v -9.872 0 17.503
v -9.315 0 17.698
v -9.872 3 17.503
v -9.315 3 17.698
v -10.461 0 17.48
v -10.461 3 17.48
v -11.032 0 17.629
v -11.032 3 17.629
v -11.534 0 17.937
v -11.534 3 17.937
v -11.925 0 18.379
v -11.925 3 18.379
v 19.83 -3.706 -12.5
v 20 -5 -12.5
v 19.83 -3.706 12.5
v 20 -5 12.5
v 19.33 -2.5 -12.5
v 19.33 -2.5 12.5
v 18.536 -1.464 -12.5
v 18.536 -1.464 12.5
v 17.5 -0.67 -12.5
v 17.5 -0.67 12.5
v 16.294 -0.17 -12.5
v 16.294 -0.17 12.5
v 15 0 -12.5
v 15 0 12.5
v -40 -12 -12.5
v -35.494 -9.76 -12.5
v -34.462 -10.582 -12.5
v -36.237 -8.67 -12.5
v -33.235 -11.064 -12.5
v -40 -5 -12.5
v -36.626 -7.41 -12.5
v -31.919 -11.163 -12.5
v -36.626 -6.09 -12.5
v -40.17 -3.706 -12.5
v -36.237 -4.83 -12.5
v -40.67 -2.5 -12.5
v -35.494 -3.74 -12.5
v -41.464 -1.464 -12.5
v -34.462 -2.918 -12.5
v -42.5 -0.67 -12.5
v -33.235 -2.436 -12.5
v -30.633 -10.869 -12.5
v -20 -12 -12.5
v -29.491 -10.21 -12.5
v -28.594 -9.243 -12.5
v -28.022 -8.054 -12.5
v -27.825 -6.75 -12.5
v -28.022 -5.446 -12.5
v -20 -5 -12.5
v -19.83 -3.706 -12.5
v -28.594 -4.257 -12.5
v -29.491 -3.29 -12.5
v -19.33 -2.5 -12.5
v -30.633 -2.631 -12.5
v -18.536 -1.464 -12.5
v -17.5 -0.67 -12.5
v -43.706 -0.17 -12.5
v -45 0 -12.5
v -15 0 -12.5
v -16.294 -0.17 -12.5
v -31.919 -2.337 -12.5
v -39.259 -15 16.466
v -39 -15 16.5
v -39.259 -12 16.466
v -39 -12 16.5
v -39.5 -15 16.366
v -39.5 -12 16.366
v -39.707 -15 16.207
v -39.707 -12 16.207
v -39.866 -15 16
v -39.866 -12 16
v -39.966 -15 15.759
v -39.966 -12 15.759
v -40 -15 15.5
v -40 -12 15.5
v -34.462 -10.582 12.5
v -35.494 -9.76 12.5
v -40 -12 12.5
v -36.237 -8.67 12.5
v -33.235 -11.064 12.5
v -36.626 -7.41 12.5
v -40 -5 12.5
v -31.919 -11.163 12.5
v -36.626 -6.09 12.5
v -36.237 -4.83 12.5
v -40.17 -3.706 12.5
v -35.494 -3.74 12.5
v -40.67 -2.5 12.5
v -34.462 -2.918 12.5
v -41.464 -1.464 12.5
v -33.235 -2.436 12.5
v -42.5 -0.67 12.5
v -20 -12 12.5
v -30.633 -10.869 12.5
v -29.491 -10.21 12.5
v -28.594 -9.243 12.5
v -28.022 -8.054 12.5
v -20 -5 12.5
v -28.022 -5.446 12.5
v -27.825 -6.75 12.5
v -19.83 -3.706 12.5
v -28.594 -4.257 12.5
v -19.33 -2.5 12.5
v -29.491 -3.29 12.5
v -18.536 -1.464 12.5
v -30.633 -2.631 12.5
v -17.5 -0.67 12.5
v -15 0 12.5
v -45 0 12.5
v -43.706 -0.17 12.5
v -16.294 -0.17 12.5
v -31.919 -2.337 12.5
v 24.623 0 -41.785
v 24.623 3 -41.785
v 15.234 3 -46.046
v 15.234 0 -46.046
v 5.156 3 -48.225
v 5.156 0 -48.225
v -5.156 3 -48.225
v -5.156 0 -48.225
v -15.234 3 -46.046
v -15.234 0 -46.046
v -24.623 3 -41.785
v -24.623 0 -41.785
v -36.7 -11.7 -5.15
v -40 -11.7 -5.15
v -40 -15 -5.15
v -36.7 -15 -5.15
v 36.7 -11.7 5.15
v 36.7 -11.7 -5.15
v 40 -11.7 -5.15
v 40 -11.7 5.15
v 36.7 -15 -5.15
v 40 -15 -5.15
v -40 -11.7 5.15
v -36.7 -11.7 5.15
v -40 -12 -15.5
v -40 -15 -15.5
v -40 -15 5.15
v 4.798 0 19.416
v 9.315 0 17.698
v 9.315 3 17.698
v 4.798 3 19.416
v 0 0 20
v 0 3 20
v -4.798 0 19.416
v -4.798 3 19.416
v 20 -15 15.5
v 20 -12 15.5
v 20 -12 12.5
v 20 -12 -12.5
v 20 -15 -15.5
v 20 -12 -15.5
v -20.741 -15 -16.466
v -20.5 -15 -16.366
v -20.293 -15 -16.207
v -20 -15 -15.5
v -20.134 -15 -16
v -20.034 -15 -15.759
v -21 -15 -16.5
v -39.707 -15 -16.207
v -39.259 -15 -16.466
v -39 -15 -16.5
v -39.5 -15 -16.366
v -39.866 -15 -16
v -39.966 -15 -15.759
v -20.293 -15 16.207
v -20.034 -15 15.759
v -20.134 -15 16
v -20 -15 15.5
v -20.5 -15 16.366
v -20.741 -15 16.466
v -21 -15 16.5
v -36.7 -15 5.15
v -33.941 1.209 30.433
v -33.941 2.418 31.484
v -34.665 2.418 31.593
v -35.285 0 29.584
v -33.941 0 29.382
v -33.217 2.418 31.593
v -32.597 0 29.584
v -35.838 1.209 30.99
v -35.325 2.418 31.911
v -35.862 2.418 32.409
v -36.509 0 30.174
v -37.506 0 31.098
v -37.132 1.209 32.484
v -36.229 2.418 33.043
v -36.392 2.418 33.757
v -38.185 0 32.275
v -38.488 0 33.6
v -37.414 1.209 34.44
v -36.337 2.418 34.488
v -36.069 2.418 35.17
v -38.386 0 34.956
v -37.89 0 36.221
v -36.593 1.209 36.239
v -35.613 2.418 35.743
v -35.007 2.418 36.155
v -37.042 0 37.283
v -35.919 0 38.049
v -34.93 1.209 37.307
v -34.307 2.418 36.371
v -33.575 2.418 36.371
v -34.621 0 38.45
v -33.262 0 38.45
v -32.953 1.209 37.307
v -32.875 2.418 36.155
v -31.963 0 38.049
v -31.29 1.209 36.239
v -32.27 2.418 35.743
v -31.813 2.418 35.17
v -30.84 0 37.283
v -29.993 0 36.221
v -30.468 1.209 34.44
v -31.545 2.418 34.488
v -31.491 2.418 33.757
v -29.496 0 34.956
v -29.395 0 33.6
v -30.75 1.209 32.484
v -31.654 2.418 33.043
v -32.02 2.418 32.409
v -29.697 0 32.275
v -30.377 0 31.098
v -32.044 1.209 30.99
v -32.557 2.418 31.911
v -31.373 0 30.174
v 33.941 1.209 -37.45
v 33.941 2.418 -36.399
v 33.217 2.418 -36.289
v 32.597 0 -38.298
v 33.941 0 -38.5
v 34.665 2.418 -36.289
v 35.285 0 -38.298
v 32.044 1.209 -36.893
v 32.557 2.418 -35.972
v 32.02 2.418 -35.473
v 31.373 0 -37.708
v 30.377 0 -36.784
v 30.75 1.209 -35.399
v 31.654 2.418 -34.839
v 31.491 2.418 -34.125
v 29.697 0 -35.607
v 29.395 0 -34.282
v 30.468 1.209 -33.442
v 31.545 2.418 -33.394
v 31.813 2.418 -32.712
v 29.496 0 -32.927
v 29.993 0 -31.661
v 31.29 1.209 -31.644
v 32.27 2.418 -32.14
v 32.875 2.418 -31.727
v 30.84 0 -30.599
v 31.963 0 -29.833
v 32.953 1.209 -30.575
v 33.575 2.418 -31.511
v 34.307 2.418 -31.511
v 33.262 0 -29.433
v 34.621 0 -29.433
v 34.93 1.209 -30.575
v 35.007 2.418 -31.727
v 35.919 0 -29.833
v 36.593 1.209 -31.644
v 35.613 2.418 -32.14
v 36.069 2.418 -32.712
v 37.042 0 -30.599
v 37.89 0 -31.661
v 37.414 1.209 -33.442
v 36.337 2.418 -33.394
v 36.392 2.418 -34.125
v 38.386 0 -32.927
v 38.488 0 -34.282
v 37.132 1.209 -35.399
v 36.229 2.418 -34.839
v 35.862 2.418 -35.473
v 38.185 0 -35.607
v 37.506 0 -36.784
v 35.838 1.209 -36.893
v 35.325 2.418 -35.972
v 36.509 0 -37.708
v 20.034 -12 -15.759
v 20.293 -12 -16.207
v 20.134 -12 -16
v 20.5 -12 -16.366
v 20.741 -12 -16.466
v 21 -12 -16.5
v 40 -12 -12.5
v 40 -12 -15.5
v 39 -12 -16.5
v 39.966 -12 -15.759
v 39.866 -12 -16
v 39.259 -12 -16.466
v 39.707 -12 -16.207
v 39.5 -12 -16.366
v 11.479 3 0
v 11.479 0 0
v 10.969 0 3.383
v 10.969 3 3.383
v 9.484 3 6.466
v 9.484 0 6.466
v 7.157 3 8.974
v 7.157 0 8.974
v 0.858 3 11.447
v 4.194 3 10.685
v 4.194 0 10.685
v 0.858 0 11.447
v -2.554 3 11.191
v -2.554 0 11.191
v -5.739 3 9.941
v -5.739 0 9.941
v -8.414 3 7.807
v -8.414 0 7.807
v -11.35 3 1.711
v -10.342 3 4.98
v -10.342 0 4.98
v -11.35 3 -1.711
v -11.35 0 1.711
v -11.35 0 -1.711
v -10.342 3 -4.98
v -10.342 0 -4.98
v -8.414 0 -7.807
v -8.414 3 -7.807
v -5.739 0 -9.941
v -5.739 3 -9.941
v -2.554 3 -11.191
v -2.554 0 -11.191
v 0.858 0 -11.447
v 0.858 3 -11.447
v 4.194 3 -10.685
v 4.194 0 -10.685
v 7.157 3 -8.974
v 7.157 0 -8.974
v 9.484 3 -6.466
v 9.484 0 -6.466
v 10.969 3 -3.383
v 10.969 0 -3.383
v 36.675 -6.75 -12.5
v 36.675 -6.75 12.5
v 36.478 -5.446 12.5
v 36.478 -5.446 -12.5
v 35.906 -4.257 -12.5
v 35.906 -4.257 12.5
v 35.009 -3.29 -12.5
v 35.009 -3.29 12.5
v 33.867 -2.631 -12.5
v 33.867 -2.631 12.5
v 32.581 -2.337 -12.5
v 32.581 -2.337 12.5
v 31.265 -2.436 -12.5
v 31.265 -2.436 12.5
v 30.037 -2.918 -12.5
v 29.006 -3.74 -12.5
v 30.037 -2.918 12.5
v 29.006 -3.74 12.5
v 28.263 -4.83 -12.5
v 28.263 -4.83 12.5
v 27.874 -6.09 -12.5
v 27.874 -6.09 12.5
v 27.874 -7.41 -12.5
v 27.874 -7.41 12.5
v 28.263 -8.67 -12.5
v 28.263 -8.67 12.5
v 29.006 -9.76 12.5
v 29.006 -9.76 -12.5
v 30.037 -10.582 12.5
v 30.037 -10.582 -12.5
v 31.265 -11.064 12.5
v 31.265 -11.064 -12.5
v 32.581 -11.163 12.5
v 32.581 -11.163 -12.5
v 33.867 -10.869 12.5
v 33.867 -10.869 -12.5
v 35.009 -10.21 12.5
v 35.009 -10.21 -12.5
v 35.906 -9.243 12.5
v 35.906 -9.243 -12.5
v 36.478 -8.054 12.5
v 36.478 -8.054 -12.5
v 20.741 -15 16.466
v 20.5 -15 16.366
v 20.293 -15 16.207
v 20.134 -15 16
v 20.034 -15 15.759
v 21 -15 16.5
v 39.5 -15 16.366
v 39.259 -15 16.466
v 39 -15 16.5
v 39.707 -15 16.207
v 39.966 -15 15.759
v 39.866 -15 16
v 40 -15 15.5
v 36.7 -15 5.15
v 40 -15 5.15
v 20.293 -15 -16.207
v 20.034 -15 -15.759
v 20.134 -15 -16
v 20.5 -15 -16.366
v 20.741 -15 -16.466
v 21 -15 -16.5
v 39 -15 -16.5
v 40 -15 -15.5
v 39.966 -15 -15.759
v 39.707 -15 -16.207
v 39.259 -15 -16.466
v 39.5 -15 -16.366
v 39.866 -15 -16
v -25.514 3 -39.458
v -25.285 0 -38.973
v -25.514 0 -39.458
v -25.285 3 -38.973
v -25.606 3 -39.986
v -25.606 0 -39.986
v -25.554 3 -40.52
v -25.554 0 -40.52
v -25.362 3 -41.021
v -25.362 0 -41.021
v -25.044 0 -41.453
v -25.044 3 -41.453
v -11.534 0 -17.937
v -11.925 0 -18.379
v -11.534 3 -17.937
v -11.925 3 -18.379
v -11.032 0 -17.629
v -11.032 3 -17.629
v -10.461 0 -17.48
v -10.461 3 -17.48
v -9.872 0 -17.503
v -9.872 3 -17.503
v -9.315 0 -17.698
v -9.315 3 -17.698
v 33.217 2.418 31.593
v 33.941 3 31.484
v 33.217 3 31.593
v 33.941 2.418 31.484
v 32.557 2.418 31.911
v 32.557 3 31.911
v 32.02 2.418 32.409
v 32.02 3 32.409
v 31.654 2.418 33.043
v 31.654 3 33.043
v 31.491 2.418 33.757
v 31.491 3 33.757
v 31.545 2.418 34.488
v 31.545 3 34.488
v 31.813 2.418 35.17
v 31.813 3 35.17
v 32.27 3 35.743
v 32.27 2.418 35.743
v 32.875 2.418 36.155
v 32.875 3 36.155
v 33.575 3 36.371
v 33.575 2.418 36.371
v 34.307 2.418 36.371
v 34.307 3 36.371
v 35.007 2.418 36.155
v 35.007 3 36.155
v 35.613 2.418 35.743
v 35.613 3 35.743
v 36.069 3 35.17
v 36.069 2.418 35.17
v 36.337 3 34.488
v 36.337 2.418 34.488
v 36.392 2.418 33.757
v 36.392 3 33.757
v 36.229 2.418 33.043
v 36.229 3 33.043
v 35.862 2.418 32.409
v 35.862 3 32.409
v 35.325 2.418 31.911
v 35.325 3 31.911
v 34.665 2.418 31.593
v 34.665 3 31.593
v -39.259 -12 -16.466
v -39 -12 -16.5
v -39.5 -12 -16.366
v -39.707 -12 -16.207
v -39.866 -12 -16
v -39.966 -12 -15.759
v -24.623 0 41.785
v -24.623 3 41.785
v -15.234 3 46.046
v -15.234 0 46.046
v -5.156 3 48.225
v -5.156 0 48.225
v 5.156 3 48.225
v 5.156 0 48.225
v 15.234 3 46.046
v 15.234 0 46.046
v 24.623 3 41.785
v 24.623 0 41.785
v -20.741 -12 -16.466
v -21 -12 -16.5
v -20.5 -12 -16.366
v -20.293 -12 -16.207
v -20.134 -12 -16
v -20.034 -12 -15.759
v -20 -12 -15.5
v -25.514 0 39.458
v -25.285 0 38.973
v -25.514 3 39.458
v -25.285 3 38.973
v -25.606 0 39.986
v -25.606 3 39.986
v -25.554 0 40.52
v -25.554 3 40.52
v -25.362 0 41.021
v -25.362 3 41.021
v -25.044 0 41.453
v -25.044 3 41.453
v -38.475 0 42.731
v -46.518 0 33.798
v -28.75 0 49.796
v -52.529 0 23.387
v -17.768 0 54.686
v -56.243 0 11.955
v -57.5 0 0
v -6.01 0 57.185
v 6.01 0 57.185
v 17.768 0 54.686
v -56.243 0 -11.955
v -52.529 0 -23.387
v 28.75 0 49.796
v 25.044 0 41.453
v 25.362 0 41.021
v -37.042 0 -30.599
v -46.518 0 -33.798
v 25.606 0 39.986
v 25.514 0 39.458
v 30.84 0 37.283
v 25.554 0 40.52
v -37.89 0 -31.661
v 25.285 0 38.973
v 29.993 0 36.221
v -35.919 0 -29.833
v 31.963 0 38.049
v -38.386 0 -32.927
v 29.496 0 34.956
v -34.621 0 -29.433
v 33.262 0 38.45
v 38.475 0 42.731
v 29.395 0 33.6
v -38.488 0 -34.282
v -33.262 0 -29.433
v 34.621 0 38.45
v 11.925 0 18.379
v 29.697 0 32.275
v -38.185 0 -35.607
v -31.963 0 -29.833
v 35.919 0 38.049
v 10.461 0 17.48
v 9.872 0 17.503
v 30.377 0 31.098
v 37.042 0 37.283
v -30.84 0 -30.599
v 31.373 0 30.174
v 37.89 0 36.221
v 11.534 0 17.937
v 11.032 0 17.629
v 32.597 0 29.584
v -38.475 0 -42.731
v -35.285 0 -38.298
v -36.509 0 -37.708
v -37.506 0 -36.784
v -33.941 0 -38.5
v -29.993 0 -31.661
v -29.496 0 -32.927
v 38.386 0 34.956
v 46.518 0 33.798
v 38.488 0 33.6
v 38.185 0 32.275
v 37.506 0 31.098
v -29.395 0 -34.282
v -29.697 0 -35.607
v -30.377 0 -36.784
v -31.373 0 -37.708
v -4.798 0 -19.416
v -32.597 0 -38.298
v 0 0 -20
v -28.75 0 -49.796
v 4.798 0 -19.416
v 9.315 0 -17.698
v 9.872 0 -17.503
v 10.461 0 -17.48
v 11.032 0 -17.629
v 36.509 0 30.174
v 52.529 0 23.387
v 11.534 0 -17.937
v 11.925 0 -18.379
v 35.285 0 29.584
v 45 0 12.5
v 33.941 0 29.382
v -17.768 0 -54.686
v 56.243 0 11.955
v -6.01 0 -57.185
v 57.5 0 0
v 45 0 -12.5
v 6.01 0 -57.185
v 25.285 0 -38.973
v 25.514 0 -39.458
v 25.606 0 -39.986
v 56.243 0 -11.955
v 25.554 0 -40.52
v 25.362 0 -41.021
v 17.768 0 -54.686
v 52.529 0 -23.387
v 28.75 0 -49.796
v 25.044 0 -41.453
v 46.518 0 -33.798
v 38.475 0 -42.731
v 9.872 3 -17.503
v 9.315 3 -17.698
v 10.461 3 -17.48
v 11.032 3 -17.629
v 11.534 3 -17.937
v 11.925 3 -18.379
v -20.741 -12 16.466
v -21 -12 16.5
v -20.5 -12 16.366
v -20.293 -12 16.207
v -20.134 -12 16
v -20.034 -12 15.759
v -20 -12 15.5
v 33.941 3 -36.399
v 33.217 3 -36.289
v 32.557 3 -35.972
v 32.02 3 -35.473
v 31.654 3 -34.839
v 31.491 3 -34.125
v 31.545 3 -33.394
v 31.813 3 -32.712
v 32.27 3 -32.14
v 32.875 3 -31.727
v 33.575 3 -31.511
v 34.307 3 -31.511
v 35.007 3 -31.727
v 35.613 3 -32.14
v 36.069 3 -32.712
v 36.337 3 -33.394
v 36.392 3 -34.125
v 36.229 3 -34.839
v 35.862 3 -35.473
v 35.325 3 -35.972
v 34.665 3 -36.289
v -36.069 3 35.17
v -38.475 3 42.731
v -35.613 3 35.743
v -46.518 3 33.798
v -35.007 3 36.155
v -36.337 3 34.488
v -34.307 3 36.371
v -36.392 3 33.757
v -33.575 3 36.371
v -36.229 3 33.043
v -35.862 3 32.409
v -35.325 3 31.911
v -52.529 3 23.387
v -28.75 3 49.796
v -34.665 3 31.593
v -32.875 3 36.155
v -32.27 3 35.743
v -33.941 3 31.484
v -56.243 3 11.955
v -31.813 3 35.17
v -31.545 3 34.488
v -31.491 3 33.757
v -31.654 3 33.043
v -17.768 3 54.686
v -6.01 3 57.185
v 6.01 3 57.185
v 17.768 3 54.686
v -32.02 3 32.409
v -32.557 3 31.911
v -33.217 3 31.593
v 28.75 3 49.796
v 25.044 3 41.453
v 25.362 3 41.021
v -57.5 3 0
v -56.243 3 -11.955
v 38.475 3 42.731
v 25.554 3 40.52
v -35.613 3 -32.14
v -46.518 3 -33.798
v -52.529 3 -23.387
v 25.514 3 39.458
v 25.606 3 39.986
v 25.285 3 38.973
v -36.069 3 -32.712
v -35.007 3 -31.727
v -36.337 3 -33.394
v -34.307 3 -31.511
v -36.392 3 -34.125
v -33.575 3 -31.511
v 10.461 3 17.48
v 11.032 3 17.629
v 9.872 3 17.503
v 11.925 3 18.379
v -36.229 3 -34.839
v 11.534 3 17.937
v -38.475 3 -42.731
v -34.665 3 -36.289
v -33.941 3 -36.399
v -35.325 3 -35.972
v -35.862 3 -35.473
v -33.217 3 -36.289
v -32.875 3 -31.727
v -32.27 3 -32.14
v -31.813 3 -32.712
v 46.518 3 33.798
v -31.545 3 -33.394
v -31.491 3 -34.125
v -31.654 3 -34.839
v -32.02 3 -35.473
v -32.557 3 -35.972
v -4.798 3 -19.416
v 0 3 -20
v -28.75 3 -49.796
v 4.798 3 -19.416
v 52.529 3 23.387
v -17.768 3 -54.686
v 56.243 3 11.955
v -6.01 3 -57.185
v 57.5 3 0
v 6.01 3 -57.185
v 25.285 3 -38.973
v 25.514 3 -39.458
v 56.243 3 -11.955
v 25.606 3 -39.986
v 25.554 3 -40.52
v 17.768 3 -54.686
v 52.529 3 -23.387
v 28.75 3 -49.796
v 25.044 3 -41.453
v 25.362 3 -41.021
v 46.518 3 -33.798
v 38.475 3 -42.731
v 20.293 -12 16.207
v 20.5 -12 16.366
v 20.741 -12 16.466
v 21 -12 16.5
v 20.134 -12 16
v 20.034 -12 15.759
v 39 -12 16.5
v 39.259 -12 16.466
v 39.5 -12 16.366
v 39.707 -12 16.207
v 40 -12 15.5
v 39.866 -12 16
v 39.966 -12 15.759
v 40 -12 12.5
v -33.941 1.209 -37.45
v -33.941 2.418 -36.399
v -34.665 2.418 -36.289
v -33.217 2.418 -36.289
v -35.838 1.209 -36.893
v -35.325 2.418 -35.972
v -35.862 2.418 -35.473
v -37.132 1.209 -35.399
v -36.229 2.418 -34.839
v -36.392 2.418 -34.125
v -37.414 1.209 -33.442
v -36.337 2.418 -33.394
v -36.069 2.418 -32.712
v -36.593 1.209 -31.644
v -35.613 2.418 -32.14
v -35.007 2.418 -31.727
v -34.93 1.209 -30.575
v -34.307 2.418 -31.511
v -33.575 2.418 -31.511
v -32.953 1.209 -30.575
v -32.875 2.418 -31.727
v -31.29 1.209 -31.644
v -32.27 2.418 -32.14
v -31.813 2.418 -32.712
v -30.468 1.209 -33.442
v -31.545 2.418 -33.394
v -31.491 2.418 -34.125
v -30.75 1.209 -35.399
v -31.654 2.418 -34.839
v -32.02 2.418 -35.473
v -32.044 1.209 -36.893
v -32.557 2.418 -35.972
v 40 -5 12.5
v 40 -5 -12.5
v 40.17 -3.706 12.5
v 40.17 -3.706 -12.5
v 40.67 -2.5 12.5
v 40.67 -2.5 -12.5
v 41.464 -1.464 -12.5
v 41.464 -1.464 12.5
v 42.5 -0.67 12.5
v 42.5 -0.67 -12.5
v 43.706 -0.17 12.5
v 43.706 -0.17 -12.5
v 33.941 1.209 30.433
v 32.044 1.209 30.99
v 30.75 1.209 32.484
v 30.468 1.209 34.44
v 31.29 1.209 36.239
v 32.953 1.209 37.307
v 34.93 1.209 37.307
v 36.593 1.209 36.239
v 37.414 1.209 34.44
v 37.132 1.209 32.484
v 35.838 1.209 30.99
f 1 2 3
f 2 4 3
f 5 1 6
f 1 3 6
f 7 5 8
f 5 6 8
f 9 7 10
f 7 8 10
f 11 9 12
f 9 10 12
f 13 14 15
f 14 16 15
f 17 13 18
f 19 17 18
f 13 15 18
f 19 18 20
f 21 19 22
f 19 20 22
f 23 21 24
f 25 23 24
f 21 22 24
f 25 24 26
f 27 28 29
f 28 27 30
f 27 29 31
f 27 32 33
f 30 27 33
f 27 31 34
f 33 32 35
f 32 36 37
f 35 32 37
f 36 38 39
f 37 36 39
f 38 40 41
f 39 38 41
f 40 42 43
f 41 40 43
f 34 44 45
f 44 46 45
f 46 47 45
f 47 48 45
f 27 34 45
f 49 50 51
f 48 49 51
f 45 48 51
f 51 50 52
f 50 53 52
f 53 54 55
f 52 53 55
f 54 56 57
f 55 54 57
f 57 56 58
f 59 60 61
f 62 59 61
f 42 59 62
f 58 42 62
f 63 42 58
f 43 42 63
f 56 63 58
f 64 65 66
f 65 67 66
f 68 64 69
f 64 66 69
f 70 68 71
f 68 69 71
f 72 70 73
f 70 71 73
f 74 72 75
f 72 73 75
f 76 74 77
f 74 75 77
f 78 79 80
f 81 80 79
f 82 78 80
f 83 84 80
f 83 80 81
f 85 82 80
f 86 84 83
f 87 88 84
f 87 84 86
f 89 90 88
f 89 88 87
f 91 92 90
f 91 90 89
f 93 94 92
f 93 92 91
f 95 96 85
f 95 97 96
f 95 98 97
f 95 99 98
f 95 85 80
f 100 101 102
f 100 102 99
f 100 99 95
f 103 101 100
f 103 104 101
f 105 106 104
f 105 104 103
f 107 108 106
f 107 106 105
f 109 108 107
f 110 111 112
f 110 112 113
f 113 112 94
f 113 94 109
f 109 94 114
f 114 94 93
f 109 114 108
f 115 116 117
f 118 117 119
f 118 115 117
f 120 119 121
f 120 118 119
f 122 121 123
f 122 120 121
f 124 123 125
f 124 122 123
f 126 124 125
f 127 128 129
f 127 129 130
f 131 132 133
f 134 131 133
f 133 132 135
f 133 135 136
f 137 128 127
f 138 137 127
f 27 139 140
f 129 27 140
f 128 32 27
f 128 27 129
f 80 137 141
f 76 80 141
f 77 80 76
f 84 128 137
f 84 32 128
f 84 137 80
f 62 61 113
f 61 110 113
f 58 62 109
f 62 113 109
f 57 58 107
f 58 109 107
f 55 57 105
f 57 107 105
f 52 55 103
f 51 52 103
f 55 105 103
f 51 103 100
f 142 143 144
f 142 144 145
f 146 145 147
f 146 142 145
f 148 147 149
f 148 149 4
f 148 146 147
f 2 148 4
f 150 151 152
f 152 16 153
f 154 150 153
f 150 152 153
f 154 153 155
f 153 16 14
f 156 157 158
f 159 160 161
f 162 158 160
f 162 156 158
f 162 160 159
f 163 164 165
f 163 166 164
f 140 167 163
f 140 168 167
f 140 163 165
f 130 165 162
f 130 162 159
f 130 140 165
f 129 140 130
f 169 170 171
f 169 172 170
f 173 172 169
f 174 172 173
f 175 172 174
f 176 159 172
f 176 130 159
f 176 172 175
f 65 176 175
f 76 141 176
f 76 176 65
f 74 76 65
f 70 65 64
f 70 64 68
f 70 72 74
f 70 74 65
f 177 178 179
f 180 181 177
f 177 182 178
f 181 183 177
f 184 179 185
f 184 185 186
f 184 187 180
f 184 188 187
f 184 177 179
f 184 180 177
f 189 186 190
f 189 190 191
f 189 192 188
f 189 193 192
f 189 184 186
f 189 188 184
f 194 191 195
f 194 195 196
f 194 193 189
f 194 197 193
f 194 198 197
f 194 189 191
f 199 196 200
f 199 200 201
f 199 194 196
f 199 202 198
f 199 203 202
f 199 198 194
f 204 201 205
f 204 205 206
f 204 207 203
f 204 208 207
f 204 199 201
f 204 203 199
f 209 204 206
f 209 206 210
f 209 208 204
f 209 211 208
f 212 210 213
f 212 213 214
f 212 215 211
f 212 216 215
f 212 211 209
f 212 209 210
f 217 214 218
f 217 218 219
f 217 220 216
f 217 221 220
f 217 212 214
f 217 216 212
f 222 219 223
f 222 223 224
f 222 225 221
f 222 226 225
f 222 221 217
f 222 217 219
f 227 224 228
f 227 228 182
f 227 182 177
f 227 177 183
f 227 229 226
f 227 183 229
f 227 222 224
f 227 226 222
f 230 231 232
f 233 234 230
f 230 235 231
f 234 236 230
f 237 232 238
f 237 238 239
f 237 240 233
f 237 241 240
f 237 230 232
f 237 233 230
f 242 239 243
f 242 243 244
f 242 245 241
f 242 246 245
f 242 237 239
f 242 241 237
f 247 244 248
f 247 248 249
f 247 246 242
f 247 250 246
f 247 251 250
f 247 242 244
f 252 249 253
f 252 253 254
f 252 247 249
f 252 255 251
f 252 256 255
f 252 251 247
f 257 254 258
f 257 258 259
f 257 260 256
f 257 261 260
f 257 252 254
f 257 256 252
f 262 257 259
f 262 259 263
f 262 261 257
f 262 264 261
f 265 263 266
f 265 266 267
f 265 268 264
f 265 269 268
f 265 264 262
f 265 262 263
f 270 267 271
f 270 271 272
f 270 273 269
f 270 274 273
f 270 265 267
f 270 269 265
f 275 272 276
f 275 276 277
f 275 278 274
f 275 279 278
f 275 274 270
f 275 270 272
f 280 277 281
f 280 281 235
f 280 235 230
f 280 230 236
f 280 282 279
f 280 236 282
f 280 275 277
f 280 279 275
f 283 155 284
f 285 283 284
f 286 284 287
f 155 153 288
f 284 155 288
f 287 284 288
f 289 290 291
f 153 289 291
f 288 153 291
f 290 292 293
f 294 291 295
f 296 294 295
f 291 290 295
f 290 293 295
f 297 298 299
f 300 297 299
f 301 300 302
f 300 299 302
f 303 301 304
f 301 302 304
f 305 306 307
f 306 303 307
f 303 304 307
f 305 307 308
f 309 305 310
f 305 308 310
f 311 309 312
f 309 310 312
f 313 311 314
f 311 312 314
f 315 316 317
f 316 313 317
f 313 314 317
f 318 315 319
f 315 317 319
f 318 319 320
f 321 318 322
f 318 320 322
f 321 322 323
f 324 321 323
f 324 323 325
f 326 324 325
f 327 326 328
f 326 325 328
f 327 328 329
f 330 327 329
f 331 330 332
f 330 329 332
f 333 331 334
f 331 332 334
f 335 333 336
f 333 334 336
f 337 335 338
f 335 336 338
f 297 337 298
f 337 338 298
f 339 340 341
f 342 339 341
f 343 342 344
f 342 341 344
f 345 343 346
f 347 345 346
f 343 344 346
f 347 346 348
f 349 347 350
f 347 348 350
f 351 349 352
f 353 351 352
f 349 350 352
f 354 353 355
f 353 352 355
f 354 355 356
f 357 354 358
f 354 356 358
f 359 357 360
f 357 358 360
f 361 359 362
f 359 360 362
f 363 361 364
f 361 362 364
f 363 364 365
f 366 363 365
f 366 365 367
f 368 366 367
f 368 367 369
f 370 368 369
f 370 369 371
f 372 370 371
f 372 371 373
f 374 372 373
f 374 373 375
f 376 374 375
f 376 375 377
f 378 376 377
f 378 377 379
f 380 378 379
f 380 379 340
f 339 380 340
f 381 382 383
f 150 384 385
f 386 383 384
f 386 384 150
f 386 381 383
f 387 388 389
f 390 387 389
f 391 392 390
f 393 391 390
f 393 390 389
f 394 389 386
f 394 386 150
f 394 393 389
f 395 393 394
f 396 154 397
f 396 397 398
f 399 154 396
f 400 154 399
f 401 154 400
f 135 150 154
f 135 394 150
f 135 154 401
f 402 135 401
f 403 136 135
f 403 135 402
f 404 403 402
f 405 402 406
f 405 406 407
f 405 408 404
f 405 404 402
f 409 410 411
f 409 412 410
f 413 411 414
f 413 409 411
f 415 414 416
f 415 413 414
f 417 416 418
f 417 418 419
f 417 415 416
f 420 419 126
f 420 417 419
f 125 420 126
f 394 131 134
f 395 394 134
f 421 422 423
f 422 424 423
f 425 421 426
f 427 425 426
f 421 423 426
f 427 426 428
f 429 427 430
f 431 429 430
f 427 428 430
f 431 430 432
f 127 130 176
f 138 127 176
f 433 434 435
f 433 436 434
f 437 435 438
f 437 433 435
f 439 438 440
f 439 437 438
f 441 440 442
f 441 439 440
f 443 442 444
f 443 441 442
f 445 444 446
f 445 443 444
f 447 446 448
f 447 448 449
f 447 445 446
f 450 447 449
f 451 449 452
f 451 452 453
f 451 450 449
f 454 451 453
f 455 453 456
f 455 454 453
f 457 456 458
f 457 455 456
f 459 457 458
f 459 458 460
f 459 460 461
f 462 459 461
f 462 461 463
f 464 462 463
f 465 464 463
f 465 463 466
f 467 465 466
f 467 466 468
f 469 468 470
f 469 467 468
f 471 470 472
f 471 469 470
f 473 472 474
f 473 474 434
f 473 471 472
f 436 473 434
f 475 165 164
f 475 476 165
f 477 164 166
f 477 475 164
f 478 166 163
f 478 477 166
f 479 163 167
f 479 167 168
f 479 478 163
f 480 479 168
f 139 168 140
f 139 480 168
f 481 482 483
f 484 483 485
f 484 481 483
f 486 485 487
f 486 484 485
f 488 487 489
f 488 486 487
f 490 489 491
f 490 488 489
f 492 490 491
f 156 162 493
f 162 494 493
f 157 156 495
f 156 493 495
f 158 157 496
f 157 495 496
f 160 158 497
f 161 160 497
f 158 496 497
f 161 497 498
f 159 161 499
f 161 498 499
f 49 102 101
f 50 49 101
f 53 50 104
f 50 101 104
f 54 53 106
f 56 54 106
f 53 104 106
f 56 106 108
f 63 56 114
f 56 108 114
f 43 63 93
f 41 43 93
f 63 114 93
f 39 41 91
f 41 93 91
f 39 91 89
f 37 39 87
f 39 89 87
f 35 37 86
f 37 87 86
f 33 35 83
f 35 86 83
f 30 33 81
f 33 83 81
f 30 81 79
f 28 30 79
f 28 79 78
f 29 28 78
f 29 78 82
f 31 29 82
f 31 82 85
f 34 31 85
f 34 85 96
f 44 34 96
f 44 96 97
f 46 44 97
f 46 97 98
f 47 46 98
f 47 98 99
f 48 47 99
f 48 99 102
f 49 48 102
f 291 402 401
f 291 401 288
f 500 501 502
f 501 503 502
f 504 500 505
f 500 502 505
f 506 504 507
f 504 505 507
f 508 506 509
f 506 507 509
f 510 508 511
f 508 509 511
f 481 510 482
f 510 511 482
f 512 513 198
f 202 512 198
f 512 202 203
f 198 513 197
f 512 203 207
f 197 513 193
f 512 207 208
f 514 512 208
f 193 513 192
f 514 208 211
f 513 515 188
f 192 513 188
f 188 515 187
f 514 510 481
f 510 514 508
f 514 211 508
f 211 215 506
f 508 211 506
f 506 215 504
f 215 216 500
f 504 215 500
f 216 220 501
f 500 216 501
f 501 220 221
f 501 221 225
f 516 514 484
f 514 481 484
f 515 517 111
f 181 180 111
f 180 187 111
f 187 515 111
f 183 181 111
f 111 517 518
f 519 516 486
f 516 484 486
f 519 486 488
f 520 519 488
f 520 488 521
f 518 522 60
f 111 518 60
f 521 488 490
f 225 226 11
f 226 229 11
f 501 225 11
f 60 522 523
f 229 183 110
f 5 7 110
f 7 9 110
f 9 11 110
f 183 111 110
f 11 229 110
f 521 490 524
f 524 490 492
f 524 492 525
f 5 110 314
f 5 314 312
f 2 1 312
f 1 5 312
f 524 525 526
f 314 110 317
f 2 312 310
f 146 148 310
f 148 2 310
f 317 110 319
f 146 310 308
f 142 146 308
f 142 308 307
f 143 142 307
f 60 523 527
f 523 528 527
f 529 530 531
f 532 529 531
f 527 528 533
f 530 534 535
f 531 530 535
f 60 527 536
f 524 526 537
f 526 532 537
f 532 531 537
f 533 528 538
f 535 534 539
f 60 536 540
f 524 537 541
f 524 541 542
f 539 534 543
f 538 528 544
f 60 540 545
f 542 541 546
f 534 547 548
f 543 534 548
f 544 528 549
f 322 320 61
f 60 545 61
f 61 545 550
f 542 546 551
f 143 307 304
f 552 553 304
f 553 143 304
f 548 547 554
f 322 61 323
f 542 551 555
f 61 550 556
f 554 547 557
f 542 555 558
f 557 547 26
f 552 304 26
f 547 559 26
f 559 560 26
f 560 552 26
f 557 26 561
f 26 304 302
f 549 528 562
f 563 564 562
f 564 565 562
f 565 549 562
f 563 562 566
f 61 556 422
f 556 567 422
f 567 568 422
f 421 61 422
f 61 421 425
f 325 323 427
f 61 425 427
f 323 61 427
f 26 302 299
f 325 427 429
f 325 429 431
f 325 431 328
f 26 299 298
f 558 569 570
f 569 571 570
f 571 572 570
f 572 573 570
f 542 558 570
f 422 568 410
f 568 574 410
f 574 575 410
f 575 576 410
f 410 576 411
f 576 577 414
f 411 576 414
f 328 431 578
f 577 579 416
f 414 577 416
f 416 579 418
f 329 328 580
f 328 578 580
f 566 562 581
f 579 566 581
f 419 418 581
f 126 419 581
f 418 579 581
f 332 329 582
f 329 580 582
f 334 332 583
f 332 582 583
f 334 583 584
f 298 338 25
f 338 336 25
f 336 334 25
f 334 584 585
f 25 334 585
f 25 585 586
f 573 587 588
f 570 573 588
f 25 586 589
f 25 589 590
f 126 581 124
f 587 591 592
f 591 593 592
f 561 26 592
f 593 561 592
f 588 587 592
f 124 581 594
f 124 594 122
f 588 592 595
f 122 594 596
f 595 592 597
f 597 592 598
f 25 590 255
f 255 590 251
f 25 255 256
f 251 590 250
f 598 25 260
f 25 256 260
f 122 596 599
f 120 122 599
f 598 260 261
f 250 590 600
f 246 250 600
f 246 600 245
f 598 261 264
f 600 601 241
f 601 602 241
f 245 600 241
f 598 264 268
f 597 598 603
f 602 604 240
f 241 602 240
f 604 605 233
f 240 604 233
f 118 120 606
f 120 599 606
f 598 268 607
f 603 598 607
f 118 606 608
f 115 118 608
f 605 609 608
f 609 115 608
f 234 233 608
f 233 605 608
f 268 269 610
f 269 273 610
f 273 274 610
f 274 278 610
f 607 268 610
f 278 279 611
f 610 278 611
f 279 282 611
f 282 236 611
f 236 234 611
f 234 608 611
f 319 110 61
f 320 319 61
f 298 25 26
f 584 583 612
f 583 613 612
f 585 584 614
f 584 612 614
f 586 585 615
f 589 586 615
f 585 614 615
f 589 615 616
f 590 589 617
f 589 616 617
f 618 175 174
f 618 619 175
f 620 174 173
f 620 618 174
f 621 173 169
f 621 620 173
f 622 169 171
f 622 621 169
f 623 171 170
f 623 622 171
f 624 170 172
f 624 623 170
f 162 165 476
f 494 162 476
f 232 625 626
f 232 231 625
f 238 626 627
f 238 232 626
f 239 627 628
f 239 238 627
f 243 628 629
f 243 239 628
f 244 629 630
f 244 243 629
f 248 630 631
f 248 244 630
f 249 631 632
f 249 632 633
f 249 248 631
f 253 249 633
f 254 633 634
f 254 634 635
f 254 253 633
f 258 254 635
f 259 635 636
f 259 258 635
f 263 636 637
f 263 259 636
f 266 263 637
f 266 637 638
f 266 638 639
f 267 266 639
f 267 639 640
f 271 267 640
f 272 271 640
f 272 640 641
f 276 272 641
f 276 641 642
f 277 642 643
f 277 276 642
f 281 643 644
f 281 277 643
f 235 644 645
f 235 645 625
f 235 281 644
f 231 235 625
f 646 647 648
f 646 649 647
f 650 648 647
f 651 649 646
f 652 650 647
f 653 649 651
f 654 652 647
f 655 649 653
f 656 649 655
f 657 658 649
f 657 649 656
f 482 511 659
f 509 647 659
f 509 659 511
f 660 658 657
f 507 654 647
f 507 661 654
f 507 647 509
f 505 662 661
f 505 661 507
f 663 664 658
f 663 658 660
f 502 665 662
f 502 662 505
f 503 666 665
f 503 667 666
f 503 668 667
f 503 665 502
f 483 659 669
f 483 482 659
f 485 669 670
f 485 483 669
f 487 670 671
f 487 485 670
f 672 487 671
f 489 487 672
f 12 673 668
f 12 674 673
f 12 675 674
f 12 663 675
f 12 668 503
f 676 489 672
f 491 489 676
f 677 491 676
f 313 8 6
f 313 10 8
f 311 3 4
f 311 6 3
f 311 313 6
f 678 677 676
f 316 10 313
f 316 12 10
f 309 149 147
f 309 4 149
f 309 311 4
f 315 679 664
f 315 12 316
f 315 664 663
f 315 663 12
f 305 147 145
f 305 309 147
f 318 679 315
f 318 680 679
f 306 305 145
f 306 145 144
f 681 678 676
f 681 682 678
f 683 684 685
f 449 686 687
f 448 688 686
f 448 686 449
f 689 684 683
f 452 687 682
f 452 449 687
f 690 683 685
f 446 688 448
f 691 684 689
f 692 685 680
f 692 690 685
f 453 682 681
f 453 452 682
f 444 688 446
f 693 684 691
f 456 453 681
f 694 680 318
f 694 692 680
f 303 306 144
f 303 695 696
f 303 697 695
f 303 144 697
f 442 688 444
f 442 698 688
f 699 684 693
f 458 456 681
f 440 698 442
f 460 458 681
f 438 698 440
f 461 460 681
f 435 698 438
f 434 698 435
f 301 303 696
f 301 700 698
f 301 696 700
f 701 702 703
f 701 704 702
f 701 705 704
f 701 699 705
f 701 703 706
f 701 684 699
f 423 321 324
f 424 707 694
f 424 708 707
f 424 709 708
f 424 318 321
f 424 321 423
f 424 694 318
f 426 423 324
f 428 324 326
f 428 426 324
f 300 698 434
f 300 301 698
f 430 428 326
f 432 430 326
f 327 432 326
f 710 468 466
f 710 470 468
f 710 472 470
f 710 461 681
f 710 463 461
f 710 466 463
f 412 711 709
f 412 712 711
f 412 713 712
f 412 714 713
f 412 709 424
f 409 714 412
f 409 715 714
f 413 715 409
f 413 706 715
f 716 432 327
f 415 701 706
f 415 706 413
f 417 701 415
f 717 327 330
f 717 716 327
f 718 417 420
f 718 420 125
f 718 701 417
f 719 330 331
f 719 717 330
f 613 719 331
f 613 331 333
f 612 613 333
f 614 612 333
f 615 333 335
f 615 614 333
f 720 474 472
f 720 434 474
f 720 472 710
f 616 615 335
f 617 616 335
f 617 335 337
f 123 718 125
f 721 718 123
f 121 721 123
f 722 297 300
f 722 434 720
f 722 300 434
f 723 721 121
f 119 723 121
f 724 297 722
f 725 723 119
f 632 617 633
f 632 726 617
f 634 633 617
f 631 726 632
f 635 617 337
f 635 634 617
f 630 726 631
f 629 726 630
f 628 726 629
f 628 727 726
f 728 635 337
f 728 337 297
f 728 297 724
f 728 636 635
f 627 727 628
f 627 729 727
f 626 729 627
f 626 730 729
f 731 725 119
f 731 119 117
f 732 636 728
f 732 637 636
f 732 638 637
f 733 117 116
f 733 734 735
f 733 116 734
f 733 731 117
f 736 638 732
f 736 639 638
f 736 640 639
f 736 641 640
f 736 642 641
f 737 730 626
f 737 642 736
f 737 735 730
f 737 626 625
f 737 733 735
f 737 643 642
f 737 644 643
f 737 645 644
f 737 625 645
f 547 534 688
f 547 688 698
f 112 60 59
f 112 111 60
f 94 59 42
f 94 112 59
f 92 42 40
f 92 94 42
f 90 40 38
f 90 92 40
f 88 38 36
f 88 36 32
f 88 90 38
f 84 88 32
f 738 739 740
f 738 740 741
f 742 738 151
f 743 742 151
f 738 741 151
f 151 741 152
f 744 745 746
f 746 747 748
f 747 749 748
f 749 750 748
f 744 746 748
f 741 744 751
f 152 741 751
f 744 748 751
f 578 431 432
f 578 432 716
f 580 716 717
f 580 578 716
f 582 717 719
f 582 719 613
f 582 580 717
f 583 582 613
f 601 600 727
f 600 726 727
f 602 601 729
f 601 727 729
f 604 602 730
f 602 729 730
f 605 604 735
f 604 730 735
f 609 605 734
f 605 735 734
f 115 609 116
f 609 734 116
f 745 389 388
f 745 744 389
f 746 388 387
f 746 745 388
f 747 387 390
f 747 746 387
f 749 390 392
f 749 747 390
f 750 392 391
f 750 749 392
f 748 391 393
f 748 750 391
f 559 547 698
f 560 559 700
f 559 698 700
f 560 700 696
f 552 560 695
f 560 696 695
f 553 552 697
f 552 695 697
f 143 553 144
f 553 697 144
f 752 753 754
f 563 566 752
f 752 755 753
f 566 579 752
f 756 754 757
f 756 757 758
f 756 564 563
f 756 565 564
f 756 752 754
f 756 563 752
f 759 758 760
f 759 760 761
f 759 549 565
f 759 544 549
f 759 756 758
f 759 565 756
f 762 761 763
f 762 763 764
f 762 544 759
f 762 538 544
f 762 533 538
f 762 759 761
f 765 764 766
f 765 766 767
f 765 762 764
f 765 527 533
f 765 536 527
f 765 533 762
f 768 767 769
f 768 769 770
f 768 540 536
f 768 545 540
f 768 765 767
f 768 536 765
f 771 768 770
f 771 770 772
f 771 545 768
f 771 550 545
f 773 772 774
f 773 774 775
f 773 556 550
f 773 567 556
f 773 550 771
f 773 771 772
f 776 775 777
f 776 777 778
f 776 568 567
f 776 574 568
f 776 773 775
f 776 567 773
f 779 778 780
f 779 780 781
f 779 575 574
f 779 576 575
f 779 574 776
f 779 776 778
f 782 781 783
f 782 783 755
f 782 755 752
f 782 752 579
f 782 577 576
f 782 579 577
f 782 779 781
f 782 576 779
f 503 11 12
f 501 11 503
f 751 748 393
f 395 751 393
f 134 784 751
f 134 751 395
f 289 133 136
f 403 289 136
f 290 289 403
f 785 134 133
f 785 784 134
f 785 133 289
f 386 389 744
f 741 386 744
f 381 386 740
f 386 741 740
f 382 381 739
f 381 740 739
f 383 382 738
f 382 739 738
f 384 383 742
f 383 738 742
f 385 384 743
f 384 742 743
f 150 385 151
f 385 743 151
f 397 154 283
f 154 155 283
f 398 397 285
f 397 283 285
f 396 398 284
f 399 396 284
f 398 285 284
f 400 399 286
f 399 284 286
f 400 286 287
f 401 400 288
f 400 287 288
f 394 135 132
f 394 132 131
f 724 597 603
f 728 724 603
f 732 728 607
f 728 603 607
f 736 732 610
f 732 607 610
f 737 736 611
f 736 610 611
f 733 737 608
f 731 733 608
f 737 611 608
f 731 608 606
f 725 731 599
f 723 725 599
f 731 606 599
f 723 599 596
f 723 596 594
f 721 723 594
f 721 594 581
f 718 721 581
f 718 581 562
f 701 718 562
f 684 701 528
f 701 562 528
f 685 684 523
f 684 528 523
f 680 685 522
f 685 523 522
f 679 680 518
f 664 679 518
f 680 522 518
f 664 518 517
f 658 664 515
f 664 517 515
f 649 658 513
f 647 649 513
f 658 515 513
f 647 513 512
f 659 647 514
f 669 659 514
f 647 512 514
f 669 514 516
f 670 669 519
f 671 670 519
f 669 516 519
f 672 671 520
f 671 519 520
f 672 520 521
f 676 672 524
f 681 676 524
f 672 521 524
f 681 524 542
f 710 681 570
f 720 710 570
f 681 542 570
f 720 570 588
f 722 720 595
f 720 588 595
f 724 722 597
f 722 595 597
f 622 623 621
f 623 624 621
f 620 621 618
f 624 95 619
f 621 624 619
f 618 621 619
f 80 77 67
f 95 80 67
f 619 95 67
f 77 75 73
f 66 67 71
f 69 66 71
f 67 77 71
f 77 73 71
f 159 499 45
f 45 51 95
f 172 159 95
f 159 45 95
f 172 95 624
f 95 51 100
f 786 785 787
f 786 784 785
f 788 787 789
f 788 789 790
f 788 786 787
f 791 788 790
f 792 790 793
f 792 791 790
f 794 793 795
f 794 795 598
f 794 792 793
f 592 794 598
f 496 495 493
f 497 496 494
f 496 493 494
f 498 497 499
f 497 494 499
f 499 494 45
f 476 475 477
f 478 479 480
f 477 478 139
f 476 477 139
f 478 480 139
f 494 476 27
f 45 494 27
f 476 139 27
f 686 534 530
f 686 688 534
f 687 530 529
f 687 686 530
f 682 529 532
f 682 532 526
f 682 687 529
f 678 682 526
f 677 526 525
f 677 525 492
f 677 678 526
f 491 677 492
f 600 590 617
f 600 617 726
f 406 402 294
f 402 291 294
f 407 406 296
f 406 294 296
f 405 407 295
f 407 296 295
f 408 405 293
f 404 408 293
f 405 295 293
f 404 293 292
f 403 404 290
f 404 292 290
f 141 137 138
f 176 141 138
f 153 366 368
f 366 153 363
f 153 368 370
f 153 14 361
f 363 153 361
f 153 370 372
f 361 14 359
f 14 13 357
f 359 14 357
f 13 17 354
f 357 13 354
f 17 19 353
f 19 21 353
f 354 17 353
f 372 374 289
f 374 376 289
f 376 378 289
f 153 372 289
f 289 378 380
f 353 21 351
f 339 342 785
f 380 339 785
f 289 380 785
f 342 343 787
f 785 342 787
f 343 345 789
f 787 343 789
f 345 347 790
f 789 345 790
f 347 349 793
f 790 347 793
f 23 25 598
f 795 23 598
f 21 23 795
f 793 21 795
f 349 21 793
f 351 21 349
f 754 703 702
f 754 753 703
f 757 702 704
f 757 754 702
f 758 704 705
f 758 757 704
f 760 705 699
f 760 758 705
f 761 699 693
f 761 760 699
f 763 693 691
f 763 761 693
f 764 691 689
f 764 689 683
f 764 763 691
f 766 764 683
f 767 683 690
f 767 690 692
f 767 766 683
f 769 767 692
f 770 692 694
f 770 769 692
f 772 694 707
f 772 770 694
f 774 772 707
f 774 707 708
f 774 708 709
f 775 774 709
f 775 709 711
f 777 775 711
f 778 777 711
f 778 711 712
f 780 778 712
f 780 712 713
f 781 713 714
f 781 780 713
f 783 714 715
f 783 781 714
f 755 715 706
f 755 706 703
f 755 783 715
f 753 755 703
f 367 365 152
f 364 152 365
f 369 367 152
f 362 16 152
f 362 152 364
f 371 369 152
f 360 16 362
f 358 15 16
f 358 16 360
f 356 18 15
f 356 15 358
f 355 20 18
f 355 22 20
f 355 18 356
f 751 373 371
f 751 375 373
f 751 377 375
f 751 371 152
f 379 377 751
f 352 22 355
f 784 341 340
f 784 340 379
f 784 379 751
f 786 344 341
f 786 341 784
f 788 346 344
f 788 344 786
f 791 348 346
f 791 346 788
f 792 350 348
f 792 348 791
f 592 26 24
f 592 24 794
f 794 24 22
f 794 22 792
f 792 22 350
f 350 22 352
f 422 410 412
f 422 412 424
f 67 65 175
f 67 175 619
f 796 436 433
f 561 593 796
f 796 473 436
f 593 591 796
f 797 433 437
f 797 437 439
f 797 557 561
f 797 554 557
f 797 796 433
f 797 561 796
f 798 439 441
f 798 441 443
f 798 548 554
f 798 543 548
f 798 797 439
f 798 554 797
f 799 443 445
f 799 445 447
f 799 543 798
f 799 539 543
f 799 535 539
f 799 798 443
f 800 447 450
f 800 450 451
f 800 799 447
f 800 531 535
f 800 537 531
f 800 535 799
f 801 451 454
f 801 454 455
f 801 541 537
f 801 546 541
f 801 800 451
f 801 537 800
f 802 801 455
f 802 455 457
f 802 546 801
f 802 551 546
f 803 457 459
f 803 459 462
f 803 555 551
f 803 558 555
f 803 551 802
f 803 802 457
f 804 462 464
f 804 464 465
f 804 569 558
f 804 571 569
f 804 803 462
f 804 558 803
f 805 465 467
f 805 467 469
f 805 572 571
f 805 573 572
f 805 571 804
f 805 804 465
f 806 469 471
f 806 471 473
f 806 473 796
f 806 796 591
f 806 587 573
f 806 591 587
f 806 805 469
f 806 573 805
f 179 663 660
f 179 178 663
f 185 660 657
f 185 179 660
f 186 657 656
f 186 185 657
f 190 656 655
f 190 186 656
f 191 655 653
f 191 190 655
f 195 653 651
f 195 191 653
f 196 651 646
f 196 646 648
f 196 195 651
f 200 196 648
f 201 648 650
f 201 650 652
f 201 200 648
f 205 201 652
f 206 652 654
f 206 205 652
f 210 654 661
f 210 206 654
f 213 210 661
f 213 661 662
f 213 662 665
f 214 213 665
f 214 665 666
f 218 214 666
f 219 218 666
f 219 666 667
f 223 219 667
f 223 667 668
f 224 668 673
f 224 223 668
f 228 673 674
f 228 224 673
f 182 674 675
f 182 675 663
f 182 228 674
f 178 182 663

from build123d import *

# Parameters (mm, degrees)
SKETCH1_R                                     = 57.5
SKETCH1_R_2                                   = 0.5
SKETCH1_W                                     = 9.3
SKETCH1_H                                     = 9.875
BOSS_EXTRUDE1_DEPTH                           = 3
CSK_FOR_8_FLAT_HEAD_SOCKET_CAP_SCREW1_A_COUNT = 2
CSK_FOR_8_FLAT_HEAD_SOCKET_CAP_SCREW1_A_PITCH = 67.882250994
CSK_FOR_8_FLAT_HEAD_SOCKET_CAP_SCRE_2_COUNT   = 2
CSK_FOR_8_FLAT_HEAD_SOCKET_CAP_SCRE_2_PITCH   = 96
CSK_FOR_8_FLAT_HEAD_SOCKET_CAP_SCRE_3_COUNT   = 2
CSK_FOR_8_FLAT_HEAD_SOCKET_CAP_SCRE_3_PITCH   = 67.882250994
SKETCH5_W                                     = 4.0625
SKETCH5_H                                     = 9.875
CUT_EXTRUDE2_DEPTH                            = 4
SKETCH6_W                                     = 20
SKETCH6_H                                     = 25
BOSS_EXTRUDE2_DEPTH                           = 15
SKETCH7_R                                     = 4.425
CUT_EXTRUDE3_DEPTH                            = 71
SKETCH8_W                                     = 33
SKETCH8_H                                     = 3
BOSS_EXTRUDE3_DEPTH                           = 20
SKETCH9_W                                     = 33
SKETCH9_H                                     = 3
BOSS_EXTRUDE4_DEPTH                           = 20
FILLET1_R                                     = 1
FILLET2_R                                     = 5
CUT_EXTRUDE4_DEPTH                            = 4
FILLET3_R                                     = 2
SKETCH11_W                                    = 3.3
SKETCH11_H                                    = 10.3
CUT_EXTRUDE5_DEPTH                            = 3.3
SKETCH12_R                                    = 11.478689494
CUT_EXTRUDE6_DEPTH                            = 4


with BuildPart() as part:
    # Sketch1 → Boss-Extrude1 (new body)
    with BuildSketch(Plane(origin=(0, 0, 0), x_dir=(1, 0, 0), z_dir=(0, 1, 0))):
        Circle(SKETCH1_R)
        with Locations((-33.941125497, 33.941125497)):
            Circle(SKETCH1_R_2, mode=Mode.SUBTRACT)
        with Locations((33.941125497, 33.941125497)):
            Circle(SKETCH1_R_2, mode=Mode.SUBTRACT)
        with Locations((33.941125497, -33.941125497)):
            Circle(SKETCH1_R_2, mode=Mode.SUBTRACT)
        with Locations((-33.941125497, -33.941125497)):
            Circle(SKETCH1_R_2, mode=Mode.SUBTRACT)
        with Locations((1.65, 0)):
            Rectangle(SKETCH1_W, SKETCH1_H, mode=Mode.SUBTRACT)
    extrude(amount=BOSS_EXTRUDE1_DEPTH)

    # Sketch2 → CSK for #8 Flat Head Socket Cap Screw1 (revolve, cut)
    with BuildSketch(Plane(origin=(-33.941125497, 0, 33.941125497), x_dir=(0, 0, -1), z_dir=(1, 0, 0))):
        Polygon((0, 0), (0, 3), (2.45745, 3), (2.45745, 2.417901837), (4.5593, 0), align=None)
    csk_for_8_flat_head_socket_cap_screw1 = revolve(axis=Axis((-33.941125497, -6.35, 33.941125497), (0, 1, 0)), mode=Mode.SUBTRACT)

    # CSK for #8 Flat Head Socket Cap Screw1 a: CSK for #8 Flat Head Socket Cap Screw1 ×2
    with Locations(*[(i * CSK_FOR_8_FLAT_HEAD_SOCKET_CAP_SCREW1_A_PITCH, 0, 0) for i in range(1, CSK_FOR_8_FLAT_HEAD_SOCKET_CAP_SCREW1_A_COUNT)]):
        add(csk_for_8_flat_head_socket_cap_screw1, mode=Mode.SUBTRACT)

    # CSK for _8 Flat Head Socket Cap Scre 2: CSK for #8 Flat Head Socket Cap Screw1 ×2
    with Locations(*[Vector(0.707106781, 0, -0.707106781) * (i * CSK_FOR_8_FLAT_HEAD_SOCKET_CAP_SCRE_2_PITCH) for i in range(1, CSK_FOR_8_FLAT_HEAD_SOCKET_CAP_SCRE_2_COUNT)]):
        add(csk_for_8_flat_head_socket_cap_screw1, mode=Mode.SUBTRACT)

    # CSK for _8 Flat Head Socket Cap Scre 3: CSK for #8 Flat Head Socket Cap Screw1 ×2
    with Locations(*[(0, 0, -i * CSK_FOR_8_FLAT_HEAD_SOCKET_CAP_SCRE_3_PITCH) for i in range(1, CSK_FOR_8_FLAT_HEAD_SOCKET_CAP_SCRE_3_COUNT)]):
        add(csk_for_8_flat_head_socket_cap_screw1, mode=Mode.SUBTRACT)

    # Sketch5 → Cut-Extrude2 (cut, through all)
    with BuildSketch(Plane.XZ):
        with Locations((8.33125, 0)):
            Rectangle(SKETCH5_W, SKETCH5_H)
        with Locations((-5.03125, 0)):
            Rectangle(SKETCH5_W, SKETCH5_H)
    extrude(amount=-CUT_EXTRUDE2_DEPTH, mode=Mode.SUBTRACT)

    # Sketch6 → Boss-Extrude2 (add)
    with BuildSketch(Plane.XZ):
        with Locations((-30, 0)):
            Rectangle(SKETCH6_W, SKETCH6_H)
        with Locations((30, 0)):
            Rectangle(SKETCH6_W, SKETCH6_H)
    extrude(amount=BOSS_EXTRUDE2_DEPTH)

    # Sketch7 → Cut-Extrude3 (cut, through all)
    with BuildSketch(Plane.XY.offset(12.5)):
        with Locations((-32.25, -6.75)):
            Circle(SKETCH7_R)
        with Locations((32.25, -6.75)):
            Circle(SKETCH7_R)
    extrude(amount=-CUT_EXTRUDE3_DEPTH, mode=Mode.SUBTRACT)

    # Sketch8 → Boss-Extrude3 (add)
    with BuildSketch(Plane.ZY.offset(40)):
        with Locations((0, -13.5)):
            Rectangle(SKETCH8_W, SKETCH8_H)
    extrude(amount=-BOSS_EXTRUDE3_DEPTH)

    # Sketch9 → Boss-Extrude4 (add)
    with BuildSketch(Plane(origin=(40, 0, 0), x_dir=(0, 0, -1), z_dir=(1, 0, 0))):
        with Locations((0, -13.5)):
            Rectangle(SKETCH9_W, SKETCH9_H)
    extrude(amount=-BOSS_EXTRUDE4_DEPTH)

    # Fillet1
    fillet1_edges = [part.edges().sort_by_distance(p)[0] for p in [
        (-40, -13.5, -16.5),
        (-40, -13.5, 16.5),
        (-20, -13.5, -16.5),
        (-20, -13.5, 16.5),
        (40, -13.5, 16.5),
        (40, -13.5, -16.5),
        (20, -13.5, 16.5),
        (20, -13.5, -16.5),
    ]]
    fillet(fillet1_edges, radius=FILLET1_R)

    # Fillet2
    fillet2_edges = [part.edges().sort_by_distance(p)[0] for p in [
        (20, 0, 0),
        (40, 0, 0),
        (-40, 0, 0),
        (-20, 0, 0),
    ]]
    fillet(fillet2_edges, radius=FILLET2_R)

    # Sketch10 → Cut-Extrude4 (cut, through all)
    with BuildSketch(Plane.XZ):
        with BuildLine():
            Line((26.397456258, 40.686905794), (10.885548972, 16.778105482))
            ThreePointArc((10.885548972, 16.778105482), (0, 20), (-10.885548972, 16.778105482))
            Line((-10.885548972, 16.778105482), (-26.397456258, 40.686905794))
            ThreePointArc((-26.397456258, 40.686905794), (0, 48.5), (26.397456258, 40.686905794))
        make_face()
        with BuildLine():
            Line((-26.397456258, -40.686905794), (-10.885548972, -16.778105482))
            ThreePointArc((-10.885548972, -16.778105482), (0, -20), (10.885548972, -16.778105482))
            Line((10.885548972, -16.778105482), (26.397456258, -40.686905794))
            ThreePointArc((26.397456258, -40.686905794), (0, -48.5), (-26.397456258, -40.686905794))
        make_face()
    extrude(amount=-CUT_EXTRUDE4_DEPTH, mode=Mode.SUBTRACT)

    # Fillet3
    fillet3_edges = [part.edges().sort_by_distance(p)[0] for p in [
        (-26.397456258, 1.5, 40.686905794),
        (26.397456258, 1.5, 40.686905794),
        (10.885548972, 1.5, 16.778105482),
        (-10.885548972, 1.5, 16.778105482),
        (-10.885548972, 1.5, -16.778105482),
        (10.885548972, 1.5, -16.778105482),
        (26.397456258, 1.5, -40.686905794),
        (-26.397456258, 1.5, -40.686905794),
    ]]
    fillet(fillet3_edges, radius=FILLET3_R)

    # Sketch11 → Cut-Extrude5 (cut)
    with BuildSketch(Plane.XZ.offset(15)):
        with Locations((-38.35, 0)):
            Rectangle(SKETCH11_W, SKETCH11_H)
        with Locations((38.35, 0)):
            Rectangle(SKETCH11_W, SKETCH11_H)
    extrude(amount=-CUT_EXTRUDE5_DEPTH, mode=Mode.SUBTRACT)

    # Sketch12 → Cut-Extrude6 (cut, through all)
    with BuildSketch(Plane.XZ):
        Circle(SKETCH12_R)
    extrude(amount=-CUT_EXTRUDE6_DEPTH, mode=Mode.SUBTRACT)


solid = part.part
